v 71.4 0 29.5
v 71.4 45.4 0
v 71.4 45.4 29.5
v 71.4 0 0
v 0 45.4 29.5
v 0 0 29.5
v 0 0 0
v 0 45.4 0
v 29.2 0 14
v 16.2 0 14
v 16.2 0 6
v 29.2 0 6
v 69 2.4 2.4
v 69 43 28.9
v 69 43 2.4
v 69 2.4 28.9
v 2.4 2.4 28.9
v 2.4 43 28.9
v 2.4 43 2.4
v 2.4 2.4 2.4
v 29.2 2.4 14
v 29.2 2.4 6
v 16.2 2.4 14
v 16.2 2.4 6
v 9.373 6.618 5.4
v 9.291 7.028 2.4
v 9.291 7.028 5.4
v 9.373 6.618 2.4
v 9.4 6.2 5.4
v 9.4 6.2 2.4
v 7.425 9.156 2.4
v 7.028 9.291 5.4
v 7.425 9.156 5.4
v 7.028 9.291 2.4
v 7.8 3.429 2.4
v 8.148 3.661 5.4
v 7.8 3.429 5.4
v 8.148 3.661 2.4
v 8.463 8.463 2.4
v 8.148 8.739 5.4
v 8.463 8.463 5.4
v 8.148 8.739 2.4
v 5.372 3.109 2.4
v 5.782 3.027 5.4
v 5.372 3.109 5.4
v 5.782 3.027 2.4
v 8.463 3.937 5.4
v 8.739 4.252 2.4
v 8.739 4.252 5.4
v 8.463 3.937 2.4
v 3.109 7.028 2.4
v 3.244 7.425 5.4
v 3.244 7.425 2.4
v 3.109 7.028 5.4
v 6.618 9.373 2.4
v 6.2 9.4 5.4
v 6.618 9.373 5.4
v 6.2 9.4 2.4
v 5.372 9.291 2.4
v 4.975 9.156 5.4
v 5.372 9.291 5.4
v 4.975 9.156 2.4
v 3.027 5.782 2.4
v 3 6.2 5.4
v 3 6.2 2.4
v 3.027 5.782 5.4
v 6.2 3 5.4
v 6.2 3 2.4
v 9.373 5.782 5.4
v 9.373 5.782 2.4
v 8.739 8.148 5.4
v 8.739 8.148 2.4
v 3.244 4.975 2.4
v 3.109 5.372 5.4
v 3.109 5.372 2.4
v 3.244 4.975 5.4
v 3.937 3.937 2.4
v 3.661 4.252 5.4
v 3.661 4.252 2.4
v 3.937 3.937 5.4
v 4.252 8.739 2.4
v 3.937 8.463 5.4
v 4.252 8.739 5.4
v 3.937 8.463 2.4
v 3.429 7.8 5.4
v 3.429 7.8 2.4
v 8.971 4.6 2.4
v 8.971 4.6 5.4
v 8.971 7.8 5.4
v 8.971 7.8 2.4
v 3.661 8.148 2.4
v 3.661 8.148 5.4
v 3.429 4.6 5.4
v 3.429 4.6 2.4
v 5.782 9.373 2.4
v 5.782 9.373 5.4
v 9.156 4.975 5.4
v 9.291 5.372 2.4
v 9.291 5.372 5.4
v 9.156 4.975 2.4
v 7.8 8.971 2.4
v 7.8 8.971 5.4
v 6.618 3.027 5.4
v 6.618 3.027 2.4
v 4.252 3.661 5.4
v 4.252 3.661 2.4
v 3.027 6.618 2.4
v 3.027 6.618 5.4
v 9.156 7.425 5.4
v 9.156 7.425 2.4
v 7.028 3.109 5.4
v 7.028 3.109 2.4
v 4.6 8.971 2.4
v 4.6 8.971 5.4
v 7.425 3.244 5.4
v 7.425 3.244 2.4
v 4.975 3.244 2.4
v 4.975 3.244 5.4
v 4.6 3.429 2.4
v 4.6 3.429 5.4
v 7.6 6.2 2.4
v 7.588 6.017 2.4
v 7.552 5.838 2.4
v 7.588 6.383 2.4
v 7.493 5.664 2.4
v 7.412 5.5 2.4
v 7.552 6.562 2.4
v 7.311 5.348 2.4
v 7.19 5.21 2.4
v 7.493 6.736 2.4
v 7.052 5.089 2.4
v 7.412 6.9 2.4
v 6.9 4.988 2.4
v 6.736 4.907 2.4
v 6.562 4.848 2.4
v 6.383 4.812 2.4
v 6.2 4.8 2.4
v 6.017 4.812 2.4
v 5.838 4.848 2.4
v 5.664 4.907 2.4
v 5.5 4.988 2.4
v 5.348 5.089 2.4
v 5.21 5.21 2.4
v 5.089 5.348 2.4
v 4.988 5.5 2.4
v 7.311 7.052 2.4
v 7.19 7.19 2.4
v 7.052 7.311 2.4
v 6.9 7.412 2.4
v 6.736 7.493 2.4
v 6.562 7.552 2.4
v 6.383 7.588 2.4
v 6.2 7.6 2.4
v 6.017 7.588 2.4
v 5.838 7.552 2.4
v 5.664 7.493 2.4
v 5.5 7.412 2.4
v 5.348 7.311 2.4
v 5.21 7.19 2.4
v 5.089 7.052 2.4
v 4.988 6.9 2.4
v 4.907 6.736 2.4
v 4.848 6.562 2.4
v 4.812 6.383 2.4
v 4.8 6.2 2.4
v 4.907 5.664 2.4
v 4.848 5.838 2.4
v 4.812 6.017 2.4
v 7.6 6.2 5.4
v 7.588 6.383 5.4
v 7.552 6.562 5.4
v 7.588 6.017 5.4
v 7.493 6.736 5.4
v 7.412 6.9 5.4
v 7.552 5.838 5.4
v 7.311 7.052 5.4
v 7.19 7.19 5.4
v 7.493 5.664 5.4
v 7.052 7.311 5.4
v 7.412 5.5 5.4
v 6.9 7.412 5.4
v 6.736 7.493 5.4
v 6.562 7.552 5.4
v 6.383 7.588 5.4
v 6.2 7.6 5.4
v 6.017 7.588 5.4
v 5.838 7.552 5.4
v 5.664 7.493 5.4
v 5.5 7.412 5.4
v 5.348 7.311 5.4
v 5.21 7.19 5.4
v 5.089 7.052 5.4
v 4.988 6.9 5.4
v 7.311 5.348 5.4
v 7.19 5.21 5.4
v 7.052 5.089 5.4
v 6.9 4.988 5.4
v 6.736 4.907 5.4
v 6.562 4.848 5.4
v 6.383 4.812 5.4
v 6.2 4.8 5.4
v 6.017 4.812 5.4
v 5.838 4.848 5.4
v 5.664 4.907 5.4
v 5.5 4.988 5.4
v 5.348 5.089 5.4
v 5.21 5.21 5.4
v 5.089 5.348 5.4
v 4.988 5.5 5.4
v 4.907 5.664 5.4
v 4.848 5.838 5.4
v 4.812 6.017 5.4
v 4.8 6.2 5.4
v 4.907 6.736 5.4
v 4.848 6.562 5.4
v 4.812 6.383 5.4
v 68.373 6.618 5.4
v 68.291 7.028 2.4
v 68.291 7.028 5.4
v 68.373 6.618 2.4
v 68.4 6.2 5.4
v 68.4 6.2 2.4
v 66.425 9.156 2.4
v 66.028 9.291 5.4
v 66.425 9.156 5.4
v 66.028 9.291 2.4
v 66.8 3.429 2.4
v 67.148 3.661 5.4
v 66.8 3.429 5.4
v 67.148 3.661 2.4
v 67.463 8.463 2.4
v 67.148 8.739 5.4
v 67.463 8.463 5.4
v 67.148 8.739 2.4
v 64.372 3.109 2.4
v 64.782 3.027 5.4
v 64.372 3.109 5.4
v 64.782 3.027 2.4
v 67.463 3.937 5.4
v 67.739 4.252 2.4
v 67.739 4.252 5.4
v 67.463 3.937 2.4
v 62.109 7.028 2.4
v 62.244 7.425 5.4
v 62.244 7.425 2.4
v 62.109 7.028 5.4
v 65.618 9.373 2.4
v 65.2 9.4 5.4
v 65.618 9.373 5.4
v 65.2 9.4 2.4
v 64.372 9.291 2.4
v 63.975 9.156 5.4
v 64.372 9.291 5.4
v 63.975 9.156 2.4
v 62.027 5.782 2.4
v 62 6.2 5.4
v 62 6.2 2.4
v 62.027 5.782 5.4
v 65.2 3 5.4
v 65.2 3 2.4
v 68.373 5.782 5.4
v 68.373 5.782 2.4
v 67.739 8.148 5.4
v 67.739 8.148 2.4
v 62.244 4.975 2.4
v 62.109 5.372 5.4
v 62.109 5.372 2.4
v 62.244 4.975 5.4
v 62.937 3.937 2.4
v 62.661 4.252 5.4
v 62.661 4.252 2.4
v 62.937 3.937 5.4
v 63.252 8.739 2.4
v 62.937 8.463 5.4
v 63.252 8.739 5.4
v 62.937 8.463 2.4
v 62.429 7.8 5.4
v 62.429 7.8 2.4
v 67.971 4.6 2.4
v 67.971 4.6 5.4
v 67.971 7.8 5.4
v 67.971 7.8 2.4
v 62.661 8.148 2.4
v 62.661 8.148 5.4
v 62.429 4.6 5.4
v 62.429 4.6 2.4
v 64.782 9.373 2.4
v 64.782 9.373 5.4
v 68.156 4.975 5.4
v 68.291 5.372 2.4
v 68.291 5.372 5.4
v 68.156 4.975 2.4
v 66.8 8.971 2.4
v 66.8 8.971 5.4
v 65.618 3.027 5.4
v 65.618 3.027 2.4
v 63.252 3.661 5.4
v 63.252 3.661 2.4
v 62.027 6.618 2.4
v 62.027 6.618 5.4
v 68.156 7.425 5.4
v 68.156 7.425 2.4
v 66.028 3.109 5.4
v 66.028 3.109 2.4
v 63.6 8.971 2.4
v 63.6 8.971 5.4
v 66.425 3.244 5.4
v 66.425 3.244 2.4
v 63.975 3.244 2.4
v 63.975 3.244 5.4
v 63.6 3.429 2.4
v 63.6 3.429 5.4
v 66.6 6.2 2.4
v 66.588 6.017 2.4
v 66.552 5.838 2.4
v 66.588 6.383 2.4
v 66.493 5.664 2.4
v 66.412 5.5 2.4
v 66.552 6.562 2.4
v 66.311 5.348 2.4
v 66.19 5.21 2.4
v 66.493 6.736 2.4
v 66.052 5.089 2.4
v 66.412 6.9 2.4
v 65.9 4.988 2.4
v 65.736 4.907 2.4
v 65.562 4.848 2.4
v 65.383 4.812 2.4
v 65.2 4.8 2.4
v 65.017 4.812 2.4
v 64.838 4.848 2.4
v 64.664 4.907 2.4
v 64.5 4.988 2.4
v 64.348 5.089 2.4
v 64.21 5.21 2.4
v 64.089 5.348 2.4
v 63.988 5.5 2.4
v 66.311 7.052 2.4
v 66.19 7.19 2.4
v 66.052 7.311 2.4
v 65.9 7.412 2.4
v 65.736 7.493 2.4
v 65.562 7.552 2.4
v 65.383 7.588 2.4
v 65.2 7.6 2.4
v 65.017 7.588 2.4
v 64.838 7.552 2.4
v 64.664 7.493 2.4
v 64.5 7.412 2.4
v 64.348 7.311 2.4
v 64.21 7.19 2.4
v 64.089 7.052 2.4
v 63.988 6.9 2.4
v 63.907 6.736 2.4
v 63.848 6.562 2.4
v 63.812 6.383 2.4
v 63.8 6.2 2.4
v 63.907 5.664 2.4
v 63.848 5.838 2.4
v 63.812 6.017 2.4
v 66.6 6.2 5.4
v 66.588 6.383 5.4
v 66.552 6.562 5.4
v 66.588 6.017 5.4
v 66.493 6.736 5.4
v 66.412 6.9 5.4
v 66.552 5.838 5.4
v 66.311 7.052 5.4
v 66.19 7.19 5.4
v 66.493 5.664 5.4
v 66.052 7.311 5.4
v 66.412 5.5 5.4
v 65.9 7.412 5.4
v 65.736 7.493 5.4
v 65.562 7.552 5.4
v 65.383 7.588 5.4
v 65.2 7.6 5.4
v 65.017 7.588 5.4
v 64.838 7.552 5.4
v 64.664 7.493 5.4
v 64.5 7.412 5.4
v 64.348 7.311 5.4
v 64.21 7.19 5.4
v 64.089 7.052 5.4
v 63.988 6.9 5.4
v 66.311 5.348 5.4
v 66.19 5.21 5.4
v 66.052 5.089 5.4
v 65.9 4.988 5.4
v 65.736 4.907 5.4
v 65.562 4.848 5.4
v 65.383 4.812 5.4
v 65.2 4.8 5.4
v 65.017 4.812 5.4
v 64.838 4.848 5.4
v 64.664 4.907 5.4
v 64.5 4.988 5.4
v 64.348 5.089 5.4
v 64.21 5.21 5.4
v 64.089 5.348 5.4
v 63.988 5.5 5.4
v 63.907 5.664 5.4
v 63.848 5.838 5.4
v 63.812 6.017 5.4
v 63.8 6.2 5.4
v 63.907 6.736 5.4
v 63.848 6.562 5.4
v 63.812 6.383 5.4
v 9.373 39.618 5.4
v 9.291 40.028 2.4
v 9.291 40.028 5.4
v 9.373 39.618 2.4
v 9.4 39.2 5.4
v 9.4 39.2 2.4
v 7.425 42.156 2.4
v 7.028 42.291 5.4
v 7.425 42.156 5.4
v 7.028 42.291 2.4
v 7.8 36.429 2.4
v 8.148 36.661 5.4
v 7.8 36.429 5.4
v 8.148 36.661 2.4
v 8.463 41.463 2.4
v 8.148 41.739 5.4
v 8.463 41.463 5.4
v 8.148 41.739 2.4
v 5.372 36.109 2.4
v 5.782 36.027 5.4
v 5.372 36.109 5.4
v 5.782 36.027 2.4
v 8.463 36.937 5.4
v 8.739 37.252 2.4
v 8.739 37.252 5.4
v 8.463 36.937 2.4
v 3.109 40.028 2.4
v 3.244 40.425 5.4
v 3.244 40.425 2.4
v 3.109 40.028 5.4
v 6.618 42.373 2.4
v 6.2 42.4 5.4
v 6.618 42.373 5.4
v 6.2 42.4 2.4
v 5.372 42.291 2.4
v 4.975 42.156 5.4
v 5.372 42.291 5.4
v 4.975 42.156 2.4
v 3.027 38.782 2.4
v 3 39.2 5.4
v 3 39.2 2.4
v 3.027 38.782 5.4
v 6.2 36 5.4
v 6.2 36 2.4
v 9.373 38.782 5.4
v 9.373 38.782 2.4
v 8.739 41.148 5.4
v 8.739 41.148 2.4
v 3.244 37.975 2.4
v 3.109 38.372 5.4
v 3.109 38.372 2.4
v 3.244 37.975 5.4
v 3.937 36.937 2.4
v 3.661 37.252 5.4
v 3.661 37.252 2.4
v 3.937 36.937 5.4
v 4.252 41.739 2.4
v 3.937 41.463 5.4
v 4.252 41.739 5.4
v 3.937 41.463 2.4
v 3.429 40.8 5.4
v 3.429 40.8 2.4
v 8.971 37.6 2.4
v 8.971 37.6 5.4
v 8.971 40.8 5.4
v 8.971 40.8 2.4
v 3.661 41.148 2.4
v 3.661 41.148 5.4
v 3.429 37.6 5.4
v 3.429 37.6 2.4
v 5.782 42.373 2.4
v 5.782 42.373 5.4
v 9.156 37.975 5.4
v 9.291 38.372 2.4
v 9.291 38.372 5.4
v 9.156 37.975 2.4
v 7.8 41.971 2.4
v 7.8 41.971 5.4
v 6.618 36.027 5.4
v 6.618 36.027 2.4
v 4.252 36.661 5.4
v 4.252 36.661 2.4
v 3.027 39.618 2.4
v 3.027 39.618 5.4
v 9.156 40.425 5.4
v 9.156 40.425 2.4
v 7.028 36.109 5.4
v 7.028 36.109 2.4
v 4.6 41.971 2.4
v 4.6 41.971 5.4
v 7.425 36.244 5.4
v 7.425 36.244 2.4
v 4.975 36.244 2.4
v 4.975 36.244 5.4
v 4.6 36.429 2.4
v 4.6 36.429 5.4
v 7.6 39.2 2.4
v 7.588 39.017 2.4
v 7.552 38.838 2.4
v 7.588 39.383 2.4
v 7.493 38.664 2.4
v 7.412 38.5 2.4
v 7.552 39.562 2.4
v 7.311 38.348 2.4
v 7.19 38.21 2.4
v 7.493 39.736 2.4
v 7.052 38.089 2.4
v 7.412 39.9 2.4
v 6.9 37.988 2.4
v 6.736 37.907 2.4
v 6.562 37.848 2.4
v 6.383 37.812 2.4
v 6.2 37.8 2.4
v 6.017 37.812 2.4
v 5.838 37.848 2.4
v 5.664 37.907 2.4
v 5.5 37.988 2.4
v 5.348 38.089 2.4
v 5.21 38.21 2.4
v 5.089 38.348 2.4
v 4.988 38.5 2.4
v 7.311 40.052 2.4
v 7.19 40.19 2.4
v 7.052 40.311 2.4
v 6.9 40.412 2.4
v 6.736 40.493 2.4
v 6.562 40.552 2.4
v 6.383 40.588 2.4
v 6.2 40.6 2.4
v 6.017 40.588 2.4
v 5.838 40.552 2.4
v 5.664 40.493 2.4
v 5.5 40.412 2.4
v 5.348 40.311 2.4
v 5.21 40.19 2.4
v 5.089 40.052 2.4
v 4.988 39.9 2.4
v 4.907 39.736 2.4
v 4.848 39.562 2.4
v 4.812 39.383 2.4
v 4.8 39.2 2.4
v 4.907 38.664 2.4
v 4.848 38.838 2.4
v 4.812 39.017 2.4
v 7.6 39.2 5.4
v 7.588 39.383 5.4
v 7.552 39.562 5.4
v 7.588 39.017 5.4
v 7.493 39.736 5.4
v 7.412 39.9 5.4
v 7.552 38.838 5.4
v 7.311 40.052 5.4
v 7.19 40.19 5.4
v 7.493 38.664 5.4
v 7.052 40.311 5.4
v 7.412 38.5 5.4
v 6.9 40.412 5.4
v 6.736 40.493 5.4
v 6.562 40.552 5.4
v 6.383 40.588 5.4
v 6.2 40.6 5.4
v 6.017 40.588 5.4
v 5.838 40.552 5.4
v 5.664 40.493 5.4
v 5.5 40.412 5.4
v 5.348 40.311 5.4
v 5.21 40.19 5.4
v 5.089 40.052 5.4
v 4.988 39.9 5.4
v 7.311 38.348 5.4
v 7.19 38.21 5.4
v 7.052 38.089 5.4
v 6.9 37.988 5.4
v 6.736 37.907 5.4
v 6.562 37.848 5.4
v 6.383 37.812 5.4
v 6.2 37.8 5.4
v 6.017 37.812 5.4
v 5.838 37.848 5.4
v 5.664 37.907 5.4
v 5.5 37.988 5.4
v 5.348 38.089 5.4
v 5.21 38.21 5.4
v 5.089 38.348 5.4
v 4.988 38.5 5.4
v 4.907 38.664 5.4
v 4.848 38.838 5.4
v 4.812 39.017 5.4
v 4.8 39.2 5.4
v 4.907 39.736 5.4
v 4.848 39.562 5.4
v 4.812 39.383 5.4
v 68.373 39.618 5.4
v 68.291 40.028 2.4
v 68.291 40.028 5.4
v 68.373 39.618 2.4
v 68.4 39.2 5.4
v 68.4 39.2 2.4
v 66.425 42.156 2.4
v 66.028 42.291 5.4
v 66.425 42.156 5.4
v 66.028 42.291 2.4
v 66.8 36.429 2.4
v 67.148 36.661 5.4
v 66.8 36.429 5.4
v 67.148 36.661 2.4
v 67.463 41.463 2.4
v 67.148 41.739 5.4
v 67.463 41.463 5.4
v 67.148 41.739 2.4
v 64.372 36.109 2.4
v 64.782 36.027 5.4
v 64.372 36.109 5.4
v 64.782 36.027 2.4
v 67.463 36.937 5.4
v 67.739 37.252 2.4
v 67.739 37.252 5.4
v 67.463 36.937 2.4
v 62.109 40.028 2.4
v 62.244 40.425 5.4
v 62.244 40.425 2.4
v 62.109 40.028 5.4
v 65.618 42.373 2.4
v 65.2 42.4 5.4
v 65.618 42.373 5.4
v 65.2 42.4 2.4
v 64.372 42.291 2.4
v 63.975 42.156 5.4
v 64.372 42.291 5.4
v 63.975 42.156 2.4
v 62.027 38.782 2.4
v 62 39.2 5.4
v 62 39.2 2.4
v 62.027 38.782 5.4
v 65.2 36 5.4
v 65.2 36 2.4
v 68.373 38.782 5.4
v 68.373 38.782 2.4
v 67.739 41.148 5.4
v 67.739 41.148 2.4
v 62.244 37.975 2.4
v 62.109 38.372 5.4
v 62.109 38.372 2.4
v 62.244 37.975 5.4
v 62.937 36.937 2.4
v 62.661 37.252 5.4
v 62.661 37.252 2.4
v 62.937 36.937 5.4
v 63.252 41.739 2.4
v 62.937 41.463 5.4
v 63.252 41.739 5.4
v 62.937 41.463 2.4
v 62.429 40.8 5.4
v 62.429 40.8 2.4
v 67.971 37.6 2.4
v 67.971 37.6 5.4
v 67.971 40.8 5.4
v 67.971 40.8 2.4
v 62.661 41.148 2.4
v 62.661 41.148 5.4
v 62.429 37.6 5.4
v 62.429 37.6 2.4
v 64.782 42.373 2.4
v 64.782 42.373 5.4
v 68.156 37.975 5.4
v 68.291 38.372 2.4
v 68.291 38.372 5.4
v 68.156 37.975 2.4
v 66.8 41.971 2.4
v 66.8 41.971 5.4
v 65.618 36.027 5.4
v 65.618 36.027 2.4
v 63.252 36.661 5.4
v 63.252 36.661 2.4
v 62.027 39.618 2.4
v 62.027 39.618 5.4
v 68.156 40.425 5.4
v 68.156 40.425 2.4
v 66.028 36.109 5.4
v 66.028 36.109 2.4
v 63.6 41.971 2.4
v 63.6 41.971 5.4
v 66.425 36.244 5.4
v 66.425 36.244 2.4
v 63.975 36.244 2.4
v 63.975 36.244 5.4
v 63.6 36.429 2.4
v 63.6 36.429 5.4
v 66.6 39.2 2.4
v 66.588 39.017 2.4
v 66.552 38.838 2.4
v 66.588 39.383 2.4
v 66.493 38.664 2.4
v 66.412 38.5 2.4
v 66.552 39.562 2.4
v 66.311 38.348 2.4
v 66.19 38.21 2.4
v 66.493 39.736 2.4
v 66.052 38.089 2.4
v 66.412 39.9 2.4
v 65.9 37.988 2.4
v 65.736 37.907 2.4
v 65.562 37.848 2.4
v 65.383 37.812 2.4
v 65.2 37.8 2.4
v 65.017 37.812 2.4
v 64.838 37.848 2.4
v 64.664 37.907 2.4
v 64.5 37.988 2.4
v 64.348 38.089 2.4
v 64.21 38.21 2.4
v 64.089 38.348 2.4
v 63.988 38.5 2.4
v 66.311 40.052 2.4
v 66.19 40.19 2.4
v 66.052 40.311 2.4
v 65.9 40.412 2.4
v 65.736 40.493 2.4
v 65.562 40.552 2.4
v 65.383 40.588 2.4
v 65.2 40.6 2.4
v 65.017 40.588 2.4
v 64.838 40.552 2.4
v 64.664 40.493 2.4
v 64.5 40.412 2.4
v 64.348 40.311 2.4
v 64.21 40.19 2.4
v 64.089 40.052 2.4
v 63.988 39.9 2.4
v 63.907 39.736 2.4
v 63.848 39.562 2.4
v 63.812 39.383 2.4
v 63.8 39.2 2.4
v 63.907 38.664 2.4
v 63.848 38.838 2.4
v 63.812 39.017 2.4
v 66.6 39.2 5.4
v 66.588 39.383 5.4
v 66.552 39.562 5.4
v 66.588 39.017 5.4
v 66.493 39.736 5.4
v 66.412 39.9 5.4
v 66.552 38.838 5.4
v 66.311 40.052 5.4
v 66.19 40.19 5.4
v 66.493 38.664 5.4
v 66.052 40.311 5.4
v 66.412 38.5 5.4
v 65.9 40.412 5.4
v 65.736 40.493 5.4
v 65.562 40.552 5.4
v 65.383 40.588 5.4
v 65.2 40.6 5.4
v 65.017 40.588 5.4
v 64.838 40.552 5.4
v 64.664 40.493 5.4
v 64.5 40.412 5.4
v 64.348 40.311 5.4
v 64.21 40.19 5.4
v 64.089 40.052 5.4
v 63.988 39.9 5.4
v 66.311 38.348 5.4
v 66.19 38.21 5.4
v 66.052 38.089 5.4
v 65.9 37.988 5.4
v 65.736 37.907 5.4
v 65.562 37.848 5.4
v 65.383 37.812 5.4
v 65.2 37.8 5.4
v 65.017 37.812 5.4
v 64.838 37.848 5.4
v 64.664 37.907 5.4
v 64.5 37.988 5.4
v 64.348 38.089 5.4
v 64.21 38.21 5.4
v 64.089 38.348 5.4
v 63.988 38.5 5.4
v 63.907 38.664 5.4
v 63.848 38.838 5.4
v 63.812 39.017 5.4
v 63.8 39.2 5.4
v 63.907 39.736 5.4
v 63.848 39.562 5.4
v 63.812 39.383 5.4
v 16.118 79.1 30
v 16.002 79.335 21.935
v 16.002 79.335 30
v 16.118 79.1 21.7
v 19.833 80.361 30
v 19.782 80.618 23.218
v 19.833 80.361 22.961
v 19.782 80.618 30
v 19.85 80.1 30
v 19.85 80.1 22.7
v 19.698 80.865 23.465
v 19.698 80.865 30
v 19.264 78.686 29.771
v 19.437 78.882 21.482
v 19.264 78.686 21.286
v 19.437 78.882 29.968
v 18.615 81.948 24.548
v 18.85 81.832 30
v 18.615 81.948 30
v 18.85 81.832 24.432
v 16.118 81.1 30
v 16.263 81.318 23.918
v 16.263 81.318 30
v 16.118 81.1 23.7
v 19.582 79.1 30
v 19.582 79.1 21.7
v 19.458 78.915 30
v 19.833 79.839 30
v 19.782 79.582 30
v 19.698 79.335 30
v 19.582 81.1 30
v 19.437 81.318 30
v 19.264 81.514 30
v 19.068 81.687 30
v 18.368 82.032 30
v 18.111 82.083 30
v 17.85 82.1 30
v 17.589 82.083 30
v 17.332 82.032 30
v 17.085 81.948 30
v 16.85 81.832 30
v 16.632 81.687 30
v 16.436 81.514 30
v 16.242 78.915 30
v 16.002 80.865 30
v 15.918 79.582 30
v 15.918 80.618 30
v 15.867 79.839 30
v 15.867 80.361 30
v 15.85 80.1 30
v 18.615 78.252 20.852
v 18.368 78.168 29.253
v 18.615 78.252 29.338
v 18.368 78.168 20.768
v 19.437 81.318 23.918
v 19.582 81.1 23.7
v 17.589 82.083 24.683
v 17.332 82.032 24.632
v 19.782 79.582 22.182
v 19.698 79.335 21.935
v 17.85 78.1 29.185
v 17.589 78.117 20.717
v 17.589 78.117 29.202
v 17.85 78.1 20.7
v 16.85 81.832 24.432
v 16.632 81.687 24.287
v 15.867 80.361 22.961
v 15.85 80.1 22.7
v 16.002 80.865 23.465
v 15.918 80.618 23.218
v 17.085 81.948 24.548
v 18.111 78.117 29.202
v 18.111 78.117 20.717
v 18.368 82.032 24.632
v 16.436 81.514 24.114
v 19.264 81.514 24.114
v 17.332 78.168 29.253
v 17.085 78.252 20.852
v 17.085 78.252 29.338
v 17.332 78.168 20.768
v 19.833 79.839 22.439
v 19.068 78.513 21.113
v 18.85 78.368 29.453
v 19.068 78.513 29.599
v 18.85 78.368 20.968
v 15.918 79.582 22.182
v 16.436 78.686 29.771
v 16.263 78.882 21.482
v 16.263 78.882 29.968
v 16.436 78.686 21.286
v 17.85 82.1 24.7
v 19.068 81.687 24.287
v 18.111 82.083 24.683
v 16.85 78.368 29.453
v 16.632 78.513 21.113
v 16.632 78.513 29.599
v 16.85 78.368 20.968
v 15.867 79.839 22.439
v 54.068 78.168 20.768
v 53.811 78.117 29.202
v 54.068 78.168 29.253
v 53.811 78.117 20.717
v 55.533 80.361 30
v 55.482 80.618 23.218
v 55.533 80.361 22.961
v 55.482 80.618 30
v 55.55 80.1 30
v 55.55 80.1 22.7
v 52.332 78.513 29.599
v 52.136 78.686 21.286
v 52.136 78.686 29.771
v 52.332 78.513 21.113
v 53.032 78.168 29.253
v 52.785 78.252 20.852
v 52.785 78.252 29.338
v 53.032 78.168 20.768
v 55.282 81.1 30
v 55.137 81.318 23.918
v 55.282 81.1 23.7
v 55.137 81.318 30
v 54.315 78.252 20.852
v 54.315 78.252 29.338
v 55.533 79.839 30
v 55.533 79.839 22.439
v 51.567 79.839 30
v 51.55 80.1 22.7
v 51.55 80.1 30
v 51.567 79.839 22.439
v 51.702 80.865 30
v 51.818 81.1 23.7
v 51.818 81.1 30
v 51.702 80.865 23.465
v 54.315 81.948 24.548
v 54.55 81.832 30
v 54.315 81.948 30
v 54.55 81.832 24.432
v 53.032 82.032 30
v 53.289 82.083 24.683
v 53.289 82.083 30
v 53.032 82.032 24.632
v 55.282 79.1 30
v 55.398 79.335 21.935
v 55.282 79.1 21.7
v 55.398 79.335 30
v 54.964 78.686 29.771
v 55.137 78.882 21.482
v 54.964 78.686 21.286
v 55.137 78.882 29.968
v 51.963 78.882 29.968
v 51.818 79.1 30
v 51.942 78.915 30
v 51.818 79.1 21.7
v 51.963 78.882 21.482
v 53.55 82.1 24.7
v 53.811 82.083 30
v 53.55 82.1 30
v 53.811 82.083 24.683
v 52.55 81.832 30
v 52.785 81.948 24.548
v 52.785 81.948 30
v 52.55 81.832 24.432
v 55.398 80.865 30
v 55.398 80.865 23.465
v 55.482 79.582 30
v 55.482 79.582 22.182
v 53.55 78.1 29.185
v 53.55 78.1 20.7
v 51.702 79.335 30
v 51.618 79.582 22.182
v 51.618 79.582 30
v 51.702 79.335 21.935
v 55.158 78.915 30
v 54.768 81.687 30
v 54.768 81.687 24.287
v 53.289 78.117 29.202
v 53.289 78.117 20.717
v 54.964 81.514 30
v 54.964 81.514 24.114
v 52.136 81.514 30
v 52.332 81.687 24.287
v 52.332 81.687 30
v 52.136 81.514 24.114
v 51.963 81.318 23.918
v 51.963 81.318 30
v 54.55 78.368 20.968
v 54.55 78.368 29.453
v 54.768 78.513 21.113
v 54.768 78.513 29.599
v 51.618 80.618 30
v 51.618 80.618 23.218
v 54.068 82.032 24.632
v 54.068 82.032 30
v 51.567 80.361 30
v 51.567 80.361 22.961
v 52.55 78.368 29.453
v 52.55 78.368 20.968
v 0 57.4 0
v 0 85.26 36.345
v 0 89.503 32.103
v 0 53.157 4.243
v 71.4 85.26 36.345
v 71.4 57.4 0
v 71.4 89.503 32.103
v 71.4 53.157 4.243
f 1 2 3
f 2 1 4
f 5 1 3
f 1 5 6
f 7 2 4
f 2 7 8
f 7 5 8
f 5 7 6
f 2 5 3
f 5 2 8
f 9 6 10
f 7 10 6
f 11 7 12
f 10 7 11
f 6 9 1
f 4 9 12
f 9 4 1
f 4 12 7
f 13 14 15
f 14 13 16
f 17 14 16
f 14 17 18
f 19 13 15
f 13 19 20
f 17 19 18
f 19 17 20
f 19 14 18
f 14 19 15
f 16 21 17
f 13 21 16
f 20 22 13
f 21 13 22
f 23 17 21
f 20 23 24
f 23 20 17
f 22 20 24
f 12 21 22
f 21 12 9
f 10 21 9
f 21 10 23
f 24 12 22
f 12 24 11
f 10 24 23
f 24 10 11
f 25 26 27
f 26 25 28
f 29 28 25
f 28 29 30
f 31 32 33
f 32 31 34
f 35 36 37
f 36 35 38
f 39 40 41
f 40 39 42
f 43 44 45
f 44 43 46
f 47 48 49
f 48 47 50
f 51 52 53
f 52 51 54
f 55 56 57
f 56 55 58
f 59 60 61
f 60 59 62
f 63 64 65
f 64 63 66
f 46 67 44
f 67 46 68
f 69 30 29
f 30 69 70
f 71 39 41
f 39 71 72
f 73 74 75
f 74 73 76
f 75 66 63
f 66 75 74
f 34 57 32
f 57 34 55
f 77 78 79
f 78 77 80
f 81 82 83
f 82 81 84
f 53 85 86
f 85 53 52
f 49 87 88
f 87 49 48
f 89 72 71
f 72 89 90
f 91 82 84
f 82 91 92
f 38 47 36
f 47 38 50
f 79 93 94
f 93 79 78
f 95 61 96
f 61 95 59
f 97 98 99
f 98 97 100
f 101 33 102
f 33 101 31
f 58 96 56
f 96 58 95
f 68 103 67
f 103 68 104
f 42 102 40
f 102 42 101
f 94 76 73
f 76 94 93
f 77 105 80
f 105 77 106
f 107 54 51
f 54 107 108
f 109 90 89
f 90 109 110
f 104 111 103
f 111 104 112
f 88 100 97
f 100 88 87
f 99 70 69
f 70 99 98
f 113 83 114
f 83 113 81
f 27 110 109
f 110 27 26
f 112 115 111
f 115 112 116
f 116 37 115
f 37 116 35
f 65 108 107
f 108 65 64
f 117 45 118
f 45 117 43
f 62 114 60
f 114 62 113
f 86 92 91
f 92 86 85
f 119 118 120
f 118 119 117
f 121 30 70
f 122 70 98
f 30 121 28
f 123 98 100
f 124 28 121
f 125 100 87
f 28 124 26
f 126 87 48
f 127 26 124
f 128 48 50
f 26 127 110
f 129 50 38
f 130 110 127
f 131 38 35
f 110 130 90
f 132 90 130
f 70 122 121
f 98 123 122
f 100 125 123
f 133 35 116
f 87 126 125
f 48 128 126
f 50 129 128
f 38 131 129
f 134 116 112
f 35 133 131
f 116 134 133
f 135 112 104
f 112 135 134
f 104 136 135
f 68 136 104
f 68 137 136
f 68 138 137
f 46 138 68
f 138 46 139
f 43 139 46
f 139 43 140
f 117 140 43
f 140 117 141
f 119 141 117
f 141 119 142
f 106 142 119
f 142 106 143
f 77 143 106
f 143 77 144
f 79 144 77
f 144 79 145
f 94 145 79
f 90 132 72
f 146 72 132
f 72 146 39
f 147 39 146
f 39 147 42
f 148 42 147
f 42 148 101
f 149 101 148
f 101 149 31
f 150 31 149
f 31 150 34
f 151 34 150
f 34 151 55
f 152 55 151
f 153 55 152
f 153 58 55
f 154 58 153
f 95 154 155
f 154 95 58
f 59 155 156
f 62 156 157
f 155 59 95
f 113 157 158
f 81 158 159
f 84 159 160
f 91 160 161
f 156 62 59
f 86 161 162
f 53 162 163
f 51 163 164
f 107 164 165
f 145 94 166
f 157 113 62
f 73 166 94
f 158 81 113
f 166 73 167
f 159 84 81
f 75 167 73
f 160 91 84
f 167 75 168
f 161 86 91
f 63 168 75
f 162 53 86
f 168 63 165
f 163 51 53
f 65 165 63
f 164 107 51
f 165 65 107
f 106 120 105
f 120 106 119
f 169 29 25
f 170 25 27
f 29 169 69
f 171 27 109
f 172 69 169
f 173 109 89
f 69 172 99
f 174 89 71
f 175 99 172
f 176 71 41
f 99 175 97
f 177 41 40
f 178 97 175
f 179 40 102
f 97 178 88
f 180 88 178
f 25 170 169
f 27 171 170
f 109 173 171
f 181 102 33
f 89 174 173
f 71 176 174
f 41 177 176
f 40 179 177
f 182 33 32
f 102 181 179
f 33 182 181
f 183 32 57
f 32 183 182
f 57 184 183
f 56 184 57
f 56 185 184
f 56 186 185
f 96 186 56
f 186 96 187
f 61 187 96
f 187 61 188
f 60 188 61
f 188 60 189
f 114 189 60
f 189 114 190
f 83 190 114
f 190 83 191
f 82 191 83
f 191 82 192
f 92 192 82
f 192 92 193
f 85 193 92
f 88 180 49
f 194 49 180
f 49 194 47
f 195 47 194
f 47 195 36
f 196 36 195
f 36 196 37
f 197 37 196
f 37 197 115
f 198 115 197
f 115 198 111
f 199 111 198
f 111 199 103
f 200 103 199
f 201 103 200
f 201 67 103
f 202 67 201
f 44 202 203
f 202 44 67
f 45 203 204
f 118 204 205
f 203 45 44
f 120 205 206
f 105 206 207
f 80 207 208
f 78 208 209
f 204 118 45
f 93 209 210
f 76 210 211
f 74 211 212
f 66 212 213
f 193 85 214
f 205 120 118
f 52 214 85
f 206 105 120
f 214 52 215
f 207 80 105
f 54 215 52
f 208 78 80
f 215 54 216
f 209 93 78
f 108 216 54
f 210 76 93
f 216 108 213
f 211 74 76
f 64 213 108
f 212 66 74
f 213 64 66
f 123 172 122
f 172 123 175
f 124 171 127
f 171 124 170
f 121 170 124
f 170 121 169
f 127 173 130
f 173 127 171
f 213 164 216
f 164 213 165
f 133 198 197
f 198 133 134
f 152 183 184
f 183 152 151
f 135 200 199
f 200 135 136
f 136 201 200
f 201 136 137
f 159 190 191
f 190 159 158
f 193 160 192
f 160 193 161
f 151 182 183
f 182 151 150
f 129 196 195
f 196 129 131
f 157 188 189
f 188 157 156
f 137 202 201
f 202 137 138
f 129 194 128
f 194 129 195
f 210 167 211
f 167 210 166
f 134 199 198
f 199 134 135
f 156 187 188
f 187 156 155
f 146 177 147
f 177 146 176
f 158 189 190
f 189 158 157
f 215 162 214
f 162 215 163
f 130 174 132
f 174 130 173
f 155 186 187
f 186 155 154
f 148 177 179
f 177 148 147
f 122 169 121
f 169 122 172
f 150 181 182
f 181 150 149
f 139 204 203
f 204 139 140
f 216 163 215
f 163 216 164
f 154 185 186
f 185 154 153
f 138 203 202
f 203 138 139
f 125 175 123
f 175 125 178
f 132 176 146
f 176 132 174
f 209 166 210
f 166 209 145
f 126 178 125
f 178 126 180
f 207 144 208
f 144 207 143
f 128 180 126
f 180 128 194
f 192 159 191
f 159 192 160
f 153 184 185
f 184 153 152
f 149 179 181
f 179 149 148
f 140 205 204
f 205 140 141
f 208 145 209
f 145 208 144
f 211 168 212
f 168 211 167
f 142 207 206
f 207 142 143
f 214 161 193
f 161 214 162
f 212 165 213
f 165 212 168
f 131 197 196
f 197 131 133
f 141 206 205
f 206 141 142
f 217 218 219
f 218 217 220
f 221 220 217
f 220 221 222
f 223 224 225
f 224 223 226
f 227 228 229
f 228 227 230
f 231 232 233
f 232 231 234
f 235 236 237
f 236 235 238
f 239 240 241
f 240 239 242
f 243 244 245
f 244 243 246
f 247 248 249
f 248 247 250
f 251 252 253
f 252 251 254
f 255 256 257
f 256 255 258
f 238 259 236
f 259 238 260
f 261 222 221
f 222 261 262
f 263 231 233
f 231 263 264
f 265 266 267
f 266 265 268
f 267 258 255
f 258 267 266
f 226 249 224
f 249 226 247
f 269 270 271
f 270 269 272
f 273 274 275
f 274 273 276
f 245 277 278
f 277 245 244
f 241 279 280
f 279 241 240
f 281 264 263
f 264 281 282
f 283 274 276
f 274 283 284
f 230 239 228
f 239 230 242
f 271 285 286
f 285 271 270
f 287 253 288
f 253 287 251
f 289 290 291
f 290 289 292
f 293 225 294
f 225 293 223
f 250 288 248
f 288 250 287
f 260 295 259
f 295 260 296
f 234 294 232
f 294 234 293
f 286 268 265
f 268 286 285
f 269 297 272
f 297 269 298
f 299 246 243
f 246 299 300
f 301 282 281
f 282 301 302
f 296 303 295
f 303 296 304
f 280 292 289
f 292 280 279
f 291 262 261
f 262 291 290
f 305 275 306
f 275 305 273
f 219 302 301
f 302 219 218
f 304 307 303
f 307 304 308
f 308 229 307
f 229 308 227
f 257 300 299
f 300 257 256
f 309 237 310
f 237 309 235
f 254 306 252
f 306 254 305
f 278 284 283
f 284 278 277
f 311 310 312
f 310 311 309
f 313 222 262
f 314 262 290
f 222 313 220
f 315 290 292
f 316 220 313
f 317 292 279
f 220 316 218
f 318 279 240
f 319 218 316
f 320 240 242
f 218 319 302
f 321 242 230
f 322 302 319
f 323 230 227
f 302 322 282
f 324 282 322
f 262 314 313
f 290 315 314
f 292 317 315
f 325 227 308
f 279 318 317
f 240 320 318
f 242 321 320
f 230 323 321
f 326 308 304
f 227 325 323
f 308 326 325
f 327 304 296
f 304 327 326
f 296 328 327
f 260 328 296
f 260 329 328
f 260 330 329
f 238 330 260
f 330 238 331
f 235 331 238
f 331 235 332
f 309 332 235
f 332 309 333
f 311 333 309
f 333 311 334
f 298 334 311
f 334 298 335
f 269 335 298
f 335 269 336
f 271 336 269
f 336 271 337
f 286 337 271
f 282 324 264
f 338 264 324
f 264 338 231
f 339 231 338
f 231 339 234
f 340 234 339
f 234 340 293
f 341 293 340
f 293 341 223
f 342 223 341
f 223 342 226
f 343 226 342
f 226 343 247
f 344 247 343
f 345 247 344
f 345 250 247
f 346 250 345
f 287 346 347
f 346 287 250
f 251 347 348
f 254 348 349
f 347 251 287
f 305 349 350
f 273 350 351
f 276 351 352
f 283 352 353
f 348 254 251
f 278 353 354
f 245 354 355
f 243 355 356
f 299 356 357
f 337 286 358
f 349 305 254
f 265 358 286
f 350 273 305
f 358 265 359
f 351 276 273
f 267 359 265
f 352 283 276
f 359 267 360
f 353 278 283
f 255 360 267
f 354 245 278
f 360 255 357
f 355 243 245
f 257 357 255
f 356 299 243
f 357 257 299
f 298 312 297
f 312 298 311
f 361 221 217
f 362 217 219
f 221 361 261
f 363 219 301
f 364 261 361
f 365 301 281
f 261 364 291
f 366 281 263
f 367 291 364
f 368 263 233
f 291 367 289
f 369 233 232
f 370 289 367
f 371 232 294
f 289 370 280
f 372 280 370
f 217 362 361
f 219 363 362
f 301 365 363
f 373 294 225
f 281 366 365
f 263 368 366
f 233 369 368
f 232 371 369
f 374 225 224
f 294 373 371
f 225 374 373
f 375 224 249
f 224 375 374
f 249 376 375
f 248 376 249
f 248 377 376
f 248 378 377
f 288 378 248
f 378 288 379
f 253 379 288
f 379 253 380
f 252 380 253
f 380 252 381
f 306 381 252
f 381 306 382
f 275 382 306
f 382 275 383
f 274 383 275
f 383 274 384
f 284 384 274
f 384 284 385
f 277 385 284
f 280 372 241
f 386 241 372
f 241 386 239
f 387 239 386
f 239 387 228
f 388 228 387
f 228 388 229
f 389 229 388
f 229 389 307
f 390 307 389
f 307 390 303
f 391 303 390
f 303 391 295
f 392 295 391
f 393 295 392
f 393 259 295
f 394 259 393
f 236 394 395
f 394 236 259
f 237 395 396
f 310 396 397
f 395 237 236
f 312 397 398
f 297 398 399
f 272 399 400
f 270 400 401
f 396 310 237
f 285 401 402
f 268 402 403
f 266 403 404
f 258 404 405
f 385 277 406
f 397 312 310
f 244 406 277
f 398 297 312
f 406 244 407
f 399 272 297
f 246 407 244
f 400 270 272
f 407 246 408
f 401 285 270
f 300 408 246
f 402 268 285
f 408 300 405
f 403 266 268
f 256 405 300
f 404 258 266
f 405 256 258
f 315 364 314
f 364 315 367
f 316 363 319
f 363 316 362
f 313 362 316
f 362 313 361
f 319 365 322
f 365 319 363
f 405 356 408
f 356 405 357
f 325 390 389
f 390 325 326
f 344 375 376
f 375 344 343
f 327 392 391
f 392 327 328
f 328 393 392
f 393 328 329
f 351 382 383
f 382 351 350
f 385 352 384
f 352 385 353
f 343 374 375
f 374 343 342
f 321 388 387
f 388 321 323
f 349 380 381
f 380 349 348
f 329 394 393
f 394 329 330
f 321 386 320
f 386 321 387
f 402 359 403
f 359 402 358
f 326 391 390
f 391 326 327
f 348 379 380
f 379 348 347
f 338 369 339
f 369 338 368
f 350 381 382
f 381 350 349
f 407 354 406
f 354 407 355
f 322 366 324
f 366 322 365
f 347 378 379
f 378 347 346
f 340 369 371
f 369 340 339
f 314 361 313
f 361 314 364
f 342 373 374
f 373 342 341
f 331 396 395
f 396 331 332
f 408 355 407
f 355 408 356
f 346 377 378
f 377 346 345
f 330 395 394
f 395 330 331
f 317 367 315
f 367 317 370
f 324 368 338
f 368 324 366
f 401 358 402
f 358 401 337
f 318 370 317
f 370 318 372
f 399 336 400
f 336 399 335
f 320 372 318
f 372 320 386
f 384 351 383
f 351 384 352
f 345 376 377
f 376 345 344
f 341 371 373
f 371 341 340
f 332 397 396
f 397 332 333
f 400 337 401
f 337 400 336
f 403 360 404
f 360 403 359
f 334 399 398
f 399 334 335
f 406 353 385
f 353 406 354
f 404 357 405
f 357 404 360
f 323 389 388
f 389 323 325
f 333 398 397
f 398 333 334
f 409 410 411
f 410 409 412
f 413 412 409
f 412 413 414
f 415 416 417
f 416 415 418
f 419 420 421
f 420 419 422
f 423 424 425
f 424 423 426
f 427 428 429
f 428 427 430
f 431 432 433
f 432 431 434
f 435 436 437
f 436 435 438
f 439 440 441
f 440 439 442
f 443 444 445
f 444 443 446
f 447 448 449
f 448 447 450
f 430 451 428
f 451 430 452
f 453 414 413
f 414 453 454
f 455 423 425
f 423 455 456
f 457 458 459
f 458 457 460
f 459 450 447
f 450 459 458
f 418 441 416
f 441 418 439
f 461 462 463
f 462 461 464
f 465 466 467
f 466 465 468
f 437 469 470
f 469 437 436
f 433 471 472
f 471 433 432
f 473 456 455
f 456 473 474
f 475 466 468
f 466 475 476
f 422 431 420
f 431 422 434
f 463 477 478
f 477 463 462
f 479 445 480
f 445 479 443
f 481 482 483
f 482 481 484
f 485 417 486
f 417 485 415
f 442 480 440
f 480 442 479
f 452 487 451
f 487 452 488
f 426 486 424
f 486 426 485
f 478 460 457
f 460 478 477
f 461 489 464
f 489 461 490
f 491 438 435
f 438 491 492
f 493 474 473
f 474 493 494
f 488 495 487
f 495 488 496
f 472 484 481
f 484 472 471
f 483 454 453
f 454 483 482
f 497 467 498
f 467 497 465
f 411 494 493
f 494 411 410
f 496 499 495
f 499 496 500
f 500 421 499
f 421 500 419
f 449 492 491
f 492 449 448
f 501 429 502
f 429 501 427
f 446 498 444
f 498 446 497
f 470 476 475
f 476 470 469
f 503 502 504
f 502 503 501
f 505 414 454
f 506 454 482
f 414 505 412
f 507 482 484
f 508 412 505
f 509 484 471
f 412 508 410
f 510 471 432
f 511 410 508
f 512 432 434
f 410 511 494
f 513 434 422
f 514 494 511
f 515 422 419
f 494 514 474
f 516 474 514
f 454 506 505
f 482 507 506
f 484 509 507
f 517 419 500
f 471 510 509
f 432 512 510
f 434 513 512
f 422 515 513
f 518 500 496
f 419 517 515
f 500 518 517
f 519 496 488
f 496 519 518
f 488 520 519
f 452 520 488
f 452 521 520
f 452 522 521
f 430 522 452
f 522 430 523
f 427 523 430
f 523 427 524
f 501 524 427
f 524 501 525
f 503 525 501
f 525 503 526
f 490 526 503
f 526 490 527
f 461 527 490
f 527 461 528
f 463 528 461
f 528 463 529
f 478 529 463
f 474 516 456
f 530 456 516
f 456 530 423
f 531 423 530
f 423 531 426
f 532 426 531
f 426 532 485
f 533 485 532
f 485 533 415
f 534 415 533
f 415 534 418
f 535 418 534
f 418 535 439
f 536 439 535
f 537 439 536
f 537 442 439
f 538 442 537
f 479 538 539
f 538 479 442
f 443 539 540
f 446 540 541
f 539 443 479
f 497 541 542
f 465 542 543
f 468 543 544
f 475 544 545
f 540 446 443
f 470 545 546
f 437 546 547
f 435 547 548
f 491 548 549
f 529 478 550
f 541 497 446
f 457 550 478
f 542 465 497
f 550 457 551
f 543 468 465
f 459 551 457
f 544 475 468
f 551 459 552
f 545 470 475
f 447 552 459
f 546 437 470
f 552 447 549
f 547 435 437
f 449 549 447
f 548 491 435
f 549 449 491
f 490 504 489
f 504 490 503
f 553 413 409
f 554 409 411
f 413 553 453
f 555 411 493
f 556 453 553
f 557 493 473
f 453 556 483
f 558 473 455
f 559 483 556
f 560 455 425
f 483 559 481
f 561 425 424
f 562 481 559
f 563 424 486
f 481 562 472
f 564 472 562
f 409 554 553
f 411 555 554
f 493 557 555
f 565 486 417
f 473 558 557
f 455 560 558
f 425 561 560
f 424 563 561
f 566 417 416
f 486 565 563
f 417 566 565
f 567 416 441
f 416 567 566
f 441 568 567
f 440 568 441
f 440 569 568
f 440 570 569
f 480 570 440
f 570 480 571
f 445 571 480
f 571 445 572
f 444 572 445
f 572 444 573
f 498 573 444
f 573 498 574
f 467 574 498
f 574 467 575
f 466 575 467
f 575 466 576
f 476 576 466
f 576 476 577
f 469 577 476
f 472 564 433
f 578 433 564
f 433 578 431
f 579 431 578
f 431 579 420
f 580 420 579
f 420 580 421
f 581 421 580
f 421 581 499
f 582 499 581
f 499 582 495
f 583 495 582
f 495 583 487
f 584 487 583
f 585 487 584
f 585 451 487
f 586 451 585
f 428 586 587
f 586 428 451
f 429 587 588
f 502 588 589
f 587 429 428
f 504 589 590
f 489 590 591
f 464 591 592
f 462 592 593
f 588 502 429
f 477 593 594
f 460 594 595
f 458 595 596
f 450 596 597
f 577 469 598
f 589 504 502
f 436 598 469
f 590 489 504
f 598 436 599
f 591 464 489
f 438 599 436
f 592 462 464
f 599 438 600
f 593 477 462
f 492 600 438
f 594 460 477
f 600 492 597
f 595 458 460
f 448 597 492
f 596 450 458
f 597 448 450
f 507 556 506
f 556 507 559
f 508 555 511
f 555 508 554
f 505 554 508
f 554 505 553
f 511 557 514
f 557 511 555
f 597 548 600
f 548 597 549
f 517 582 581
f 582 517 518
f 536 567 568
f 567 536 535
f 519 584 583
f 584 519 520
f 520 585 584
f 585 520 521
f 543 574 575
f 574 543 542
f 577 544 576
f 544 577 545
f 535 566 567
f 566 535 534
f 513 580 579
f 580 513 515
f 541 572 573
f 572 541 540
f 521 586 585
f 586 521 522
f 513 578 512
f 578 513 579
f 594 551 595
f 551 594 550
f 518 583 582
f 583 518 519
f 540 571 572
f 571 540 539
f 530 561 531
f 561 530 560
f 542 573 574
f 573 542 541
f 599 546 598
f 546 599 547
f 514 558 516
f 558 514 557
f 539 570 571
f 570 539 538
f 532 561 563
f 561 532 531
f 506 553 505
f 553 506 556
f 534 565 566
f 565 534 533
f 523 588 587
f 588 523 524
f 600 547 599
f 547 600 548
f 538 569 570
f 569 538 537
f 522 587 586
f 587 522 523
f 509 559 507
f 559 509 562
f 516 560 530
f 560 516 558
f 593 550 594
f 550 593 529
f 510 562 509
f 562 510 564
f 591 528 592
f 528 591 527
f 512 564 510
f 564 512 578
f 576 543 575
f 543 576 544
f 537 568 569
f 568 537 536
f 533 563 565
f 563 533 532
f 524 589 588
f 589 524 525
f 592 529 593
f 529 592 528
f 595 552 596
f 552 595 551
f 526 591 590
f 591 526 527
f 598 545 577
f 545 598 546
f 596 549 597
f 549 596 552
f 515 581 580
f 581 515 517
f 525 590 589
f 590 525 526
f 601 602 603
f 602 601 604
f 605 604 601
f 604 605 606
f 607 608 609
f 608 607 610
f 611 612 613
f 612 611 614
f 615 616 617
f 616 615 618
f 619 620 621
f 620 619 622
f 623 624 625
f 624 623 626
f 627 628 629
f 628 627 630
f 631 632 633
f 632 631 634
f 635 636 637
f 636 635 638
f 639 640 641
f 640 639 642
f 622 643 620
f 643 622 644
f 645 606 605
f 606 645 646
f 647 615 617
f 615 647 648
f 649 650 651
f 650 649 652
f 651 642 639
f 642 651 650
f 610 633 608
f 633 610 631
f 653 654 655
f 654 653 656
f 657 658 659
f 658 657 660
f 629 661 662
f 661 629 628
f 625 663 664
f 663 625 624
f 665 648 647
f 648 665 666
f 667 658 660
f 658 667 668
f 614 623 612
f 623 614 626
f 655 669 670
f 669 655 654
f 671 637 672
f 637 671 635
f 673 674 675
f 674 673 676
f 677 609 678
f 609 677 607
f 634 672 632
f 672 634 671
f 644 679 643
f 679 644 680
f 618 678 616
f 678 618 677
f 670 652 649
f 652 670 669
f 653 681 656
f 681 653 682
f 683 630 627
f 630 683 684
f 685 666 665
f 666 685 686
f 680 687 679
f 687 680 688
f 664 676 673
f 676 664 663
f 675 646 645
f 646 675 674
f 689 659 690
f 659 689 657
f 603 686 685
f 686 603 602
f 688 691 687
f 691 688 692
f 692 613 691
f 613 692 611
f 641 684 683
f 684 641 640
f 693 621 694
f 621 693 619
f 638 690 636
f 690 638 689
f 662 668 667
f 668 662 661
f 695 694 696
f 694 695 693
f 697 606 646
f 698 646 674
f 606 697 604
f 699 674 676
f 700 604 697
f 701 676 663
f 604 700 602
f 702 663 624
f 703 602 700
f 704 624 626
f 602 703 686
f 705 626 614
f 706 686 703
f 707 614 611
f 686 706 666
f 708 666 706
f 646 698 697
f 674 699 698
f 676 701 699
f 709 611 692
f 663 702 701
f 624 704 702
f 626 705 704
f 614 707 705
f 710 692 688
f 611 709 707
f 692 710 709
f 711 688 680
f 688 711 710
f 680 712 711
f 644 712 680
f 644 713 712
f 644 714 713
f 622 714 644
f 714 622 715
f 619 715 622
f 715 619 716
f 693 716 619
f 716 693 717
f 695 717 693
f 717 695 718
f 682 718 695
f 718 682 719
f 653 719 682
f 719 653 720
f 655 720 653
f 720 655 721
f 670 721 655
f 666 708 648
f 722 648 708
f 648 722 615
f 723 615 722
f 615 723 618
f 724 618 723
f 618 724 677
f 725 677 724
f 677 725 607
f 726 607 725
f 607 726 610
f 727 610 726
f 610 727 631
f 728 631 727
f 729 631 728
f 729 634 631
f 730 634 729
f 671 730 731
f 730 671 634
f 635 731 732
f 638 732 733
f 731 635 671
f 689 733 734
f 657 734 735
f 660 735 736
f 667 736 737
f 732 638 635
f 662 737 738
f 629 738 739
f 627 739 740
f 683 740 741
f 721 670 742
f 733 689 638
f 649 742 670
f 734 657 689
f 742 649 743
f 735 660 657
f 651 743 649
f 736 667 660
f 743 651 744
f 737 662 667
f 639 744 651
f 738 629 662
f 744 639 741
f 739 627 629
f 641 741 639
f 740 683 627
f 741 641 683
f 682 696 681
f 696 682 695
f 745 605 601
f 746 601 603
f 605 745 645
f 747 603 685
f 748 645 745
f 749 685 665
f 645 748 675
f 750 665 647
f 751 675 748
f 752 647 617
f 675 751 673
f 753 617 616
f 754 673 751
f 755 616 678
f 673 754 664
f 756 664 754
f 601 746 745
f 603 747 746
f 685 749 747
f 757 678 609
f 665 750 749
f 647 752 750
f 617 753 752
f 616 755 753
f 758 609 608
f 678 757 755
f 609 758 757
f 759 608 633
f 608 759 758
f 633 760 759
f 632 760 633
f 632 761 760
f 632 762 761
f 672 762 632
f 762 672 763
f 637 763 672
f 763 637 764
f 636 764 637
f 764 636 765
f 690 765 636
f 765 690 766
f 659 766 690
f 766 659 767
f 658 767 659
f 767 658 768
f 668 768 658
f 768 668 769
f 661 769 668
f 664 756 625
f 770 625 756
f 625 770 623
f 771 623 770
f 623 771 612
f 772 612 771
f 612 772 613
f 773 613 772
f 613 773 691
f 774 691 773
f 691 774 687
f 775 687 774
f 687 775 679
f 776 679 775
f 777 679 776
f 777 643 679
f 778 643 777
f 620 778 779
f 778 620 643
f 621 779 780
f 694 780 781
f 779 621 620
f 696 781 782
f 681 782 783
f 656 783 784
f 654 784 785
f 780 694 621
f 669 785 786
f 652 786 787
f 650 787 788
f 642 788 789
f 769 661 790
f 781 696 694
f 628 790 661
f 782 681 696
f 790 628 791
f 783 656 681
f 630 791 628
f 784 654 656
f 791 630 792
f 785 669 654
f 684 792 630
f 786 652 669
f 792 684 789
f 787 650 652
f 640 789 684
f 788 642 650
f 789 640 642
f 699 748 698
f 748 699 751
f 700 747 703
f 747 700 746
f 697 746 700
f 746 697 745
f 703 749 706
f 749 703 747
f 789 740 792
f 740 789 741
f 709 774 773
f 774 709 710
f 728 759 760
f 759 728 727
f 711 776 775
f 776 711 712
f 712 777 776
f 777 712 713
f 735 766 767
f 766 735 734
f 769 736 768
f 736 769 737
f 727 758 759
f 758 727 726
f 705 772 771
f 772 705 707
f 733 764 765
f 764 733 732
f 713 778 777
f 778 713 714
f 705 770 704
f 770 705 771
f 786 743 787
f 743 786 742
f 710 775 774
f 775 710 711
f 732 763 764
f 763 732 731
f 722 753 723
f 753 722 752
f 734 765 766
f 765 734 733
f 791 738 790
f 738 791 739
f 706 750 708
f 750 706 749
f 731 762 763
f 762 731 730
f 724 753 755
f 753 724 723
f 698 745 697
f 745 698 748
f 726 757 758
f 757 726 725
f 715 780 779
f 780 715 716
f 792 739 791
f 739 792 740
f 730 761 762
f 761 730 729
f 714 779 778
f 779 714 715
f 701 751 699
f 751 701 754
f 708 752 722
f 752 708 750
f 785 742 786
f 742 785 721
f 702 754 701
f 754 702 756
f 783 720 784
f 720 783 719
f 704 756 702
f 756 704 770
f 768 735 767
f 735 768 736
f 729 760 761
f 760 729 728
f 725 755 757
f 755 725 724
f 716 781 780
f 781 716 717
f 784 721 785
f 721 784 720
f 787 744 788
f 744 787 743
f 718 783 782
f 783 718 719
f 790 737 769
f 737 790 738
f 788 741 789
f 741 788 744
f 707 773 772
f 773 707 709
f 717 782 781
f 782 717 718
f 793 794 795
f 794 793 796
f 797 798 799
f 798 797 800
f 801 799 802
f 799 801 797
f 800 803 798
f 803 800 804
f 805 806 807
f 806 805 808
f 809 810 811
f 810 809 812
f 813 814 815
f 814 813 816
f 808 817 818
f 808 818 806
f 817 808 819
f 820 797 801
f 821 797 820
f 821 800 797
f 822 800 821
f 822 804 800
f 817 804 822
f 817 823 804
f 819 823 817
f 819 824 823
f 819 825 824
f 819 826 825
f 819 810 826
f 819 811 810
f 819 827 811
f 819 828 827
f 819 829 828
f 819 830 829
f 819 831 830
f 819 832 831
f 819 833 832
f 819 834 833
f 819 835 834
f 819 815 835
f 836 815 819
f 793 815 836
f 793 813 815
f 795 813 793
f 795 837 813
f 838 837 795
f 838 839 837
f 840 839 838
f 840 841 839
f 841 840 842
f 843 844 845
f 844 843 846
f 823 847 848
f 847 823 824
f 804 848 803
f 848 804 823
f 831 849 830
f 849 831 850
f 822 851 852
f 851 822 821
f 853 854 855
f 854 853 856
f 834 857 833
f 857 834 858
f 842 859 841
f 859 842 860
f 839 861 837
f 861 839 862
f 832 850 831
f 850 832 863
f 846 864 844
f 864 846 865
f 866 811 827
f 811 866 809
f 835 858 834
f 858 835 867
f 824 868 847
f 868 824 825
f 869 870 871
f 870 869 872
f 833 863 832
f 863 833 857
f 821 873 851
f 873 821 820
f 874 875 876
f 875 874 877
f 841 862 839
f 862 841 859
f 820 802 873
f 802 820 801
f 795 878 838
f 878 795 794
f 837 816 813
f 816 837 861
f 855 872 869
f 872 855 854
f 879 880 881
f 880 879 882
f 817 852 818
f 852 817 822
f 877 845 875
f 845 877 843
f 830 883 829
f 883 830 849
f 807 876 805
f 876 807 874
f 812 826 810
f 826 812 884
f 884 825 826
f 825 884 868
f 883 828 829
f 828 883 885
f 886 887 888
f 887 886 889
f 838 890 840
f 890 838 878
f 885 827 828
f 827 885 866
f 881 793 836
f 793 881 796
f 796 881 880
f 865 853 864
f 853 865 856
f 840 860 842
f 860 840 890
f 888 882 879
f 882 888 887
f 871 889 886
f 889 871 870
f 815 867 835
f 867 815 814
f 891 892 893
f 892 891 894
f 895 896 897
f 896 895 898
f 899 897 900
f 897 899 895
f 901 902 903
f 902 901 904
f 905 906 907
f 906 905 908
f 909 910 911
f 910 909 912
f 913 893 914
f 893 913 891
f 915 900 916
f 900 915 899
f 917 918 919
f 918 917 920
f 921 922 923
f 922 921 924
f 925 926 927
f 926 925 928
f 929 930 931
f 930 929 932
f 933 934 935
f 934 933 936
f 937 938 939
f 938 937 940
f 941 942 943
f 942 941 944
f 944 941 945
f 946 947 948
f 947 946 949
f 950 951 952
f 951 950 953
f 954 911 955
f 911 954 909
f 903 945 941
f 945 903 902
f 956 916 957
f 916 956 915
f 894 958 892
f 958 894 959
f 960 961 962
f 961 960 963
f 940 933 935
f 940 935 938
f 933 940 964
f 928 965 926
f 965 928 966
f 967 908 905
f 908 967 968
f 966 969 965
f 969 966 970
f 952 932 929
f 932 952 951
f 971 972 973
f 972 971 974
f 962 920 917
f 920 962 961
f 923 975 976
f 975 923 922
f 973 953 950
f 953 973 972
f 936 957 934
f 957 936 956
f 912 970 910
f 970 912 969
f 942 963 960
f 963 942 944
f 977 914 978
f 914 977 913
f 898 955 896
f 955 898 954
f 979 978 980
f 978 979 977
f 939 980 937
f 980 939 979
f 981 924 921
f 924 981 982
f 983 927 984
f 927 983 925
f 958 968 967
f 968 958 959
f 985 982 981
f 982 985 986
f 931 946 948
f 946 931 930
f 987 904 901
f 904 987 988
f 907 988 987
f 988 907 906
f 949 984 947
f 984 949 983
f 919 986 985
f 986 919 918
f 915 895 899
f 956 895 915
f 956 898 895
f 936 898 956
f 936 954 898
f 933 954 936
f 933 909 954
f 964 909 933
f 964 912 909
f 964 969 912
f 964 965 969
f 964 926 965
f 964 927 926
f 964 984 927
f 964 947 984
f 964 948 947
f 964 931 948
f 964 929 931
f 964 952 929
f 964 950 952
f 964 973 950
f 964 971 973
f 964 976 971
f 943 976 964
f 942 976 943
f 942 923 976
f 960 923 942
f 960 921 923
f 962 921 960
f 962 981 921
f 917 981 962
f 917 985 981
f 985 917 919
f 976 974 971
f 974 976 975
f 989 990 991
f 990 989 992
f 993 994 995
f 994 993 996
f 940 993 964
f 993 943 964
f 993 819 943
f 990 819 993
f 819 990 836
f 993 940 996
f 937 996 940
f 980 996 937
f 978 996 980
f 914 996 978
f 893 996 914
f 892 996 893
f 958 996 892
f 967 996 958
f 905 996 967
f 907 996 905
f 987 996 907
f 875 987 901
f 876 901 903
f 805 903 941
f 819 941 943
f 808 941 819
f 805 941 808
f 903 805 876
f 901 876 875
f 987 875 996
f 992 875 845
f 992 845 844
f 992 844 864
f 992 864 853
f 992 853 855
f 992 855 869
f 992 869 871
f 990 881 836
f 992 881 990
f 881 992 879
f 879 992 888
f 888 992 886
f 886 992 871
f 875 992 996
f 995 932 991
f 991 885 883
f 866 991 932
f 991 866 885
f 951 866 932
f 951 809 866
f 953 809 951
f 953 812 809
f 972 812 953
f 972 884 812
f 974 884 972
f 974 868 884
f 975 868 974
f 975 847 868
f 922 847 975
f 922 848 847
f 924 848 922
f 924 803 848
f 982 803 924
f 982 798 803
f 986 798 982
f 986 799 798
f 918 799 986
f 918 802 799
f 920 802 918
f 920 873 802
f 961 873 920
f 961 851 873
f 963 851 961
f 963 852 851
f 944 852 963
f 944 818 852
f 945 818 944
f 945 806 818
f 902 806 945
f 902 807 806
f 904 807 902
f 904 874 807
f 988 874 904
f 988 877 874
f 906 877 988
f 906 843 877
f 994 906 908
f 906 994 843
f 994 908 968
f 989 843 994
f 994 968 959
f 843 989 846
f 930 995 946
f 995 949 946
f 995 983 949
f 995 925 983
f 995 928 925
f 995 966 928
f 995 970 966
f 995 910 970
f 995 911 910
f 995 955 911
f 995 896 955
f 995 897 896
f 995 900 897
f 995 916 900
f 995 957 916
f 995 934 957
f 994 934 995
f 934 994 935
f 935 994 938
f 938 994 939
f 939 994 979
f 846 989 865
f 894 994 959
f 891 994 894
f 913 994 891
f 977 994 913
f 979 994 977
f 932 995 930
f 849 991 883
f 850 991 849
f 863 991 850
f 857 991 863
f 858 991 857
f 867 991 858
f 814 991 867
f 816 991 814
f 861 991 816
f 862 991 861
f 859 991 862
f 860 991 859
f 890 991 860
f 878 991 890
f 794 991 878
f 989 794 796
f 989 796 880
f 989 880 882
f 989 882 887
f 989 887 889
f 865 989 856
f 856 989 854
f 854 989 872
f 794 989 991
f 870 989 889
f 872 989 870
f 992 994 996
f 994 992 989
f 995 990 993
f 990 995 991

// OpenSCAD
// KnightWatcher — Andar ADTE210400XXNA + HLK-LD6002 enclosure
// Wall/headboard mount, fixed tilt, radome front.
//
// STATUS: DRAFT — every dimension marked CALIPER below is a placeholder
// estimated from a photo (scaled off the 8.94mm USB-C receptacle and 2.54mm
// header pitch). Replace with real caliper measurements before printing.
//
// Radome physics (60 GHz): the front window prints SOLID (100% infill) at
// radome_thickness ~= a half-wavelength in the plastic, which minimizes
// reflection. PLA/PETG only - never silk, metallic, or carbon-fiber filament
// in front of the antenna. Set radome_open=true for a plain cutout instead;
// print one of each and A/B them with the 5-minute lock test.

/* [Andar carrier board - CALIPER] */
board_length      = 66;    // CALIPER mm, long axis
board_width       = 40;    // CALIPER mm
board_thickness   = 1.6;   // PCB standard
stack_height      = 20;    // CALIPER mm, carrier bottom -> top of LD6002
back_clearance    = 3;     // CALIPER mm, tallest thing below the carrier

/* [USB-C exit - CALIPER] */
usbc_edge_offset  = 20;    // CALIPER mm, connector center from board corner
usbc_cut_w        = 13;    // clearance for plug overmold
usbc_cut_h        = 8;

/* [Mount holes on carrier - CALIPER] */
hole_dia          = 3.2;   // CALIPER mm (M3 standoffs assumed)
hole_inset_x      = 3.5;   // CALIPER mm from board corner
hole_inset_y      = 3.5;   // CALIPER

/* [LD6002 window - CALIPER] */
// The green module's antenna face; window must frame both patch antennas.
module_w          = 35;    // CALIPER mm
module_h          = 35;    // CALIPER mm
module_off_x      = 15;    // CALIPER mm, module corner from carrier corner
module_off_y      = 2;     // CALIPER

/* [Radome] */
radome_open       = false; // true = cutout, false = solid thin window
radome_thickness  = 1.6;   // ~half-wave in PLA/PETG at 60 GHz
radome_standoff   = 2.5;   // air gap to antenna face, ~lambda/2 steps

/* [Case] */
wall              = 2.4;   // 3 perimeters at 0.8
fit_tol           = 0.3;
tilt_angle        = 45;    // headboard aim-down; print variants 30/45/60
mount_hole_dia    = 4;
$fn = 48;

// ---- derived ----
cav_l = board_length + fit_tol*2;
cav_w = board_width  + fit_tol*2;
cav_d = stack_height + back_clearance + radome_standoff;

outer_l = cav_l + wall*2;
outer_w = cav_w + wall*2;
outer_d = cav_d + wall + (radome_open ? wall : radome_thickness);

module standoffs() {
    for (p = [[hole_inset_x, hole_inset_y],
              [board_length - hole_inset_x, hole_inset_y],
              [hole_inset_x, board_width - hole_inset_y],
              [board_length - hole_inset_x, board_width - hole_inset_y]])
        translate([wall + fit_tol + p[0], wall + fit_tol + p[1], wall])
            difference() {
                cylinder(d=hole_dia + 3.2, h=back_clearance);
                cylinder(d=hole_dia - 0.4, h=back_clearance + 1); // self-tap M3
            }
}

module shell() {
    difference() {
        cube([outer_l, outer_w, outer_d]);
        // cavity
        translate([wall, wall, wall])
            cube([cav_l, cav_w, cav_d + 1]);
        // radome window (top face = front, prints face-down for smooth finish)
        win_x = wall + fit_tol + module_off_x - 2;
        win_y = wall + fit_tol + module_off_y - 2;
        translate([win_x, win_y, radome_open
                   ? outer_d - wall - 0.01
                   : outer_d - radome_thickness - (wall - radome_thickness)])
            cube([module_w + 4, module_h + 4,
                  radome_open ? wall + 1 : (wall - radome_thickness) + 0.01]);
        // USB-C exit, bottom edge
        translate([wall + fit_tol + usbc_edge_offset - usbc_cut_w/2, -1,
                   wall + back_clearance + board_thickness - 1])
            cube([usbc_cut_w, wall + 2, usbc_cut_h]);
    }
    standoffs();
}

module wedge() {
    // Separate wall wedge; case screws to it. Rigid, no joints to droop.
    w = outer_w;
    difference() {
        rotate([tilt_angle, 0, 0])
            cube([outer_l, w, 6]);
        // keyhole slots for wall screws
        for (x = [outer_l*0.25, outer_l*0.75])
            translate([x, w*0.5, -10]) cylinder(d=mount_hole_dia, h=40);
    }
}

shell();
translate([0, outer_w + 12, 0]) wedge();
